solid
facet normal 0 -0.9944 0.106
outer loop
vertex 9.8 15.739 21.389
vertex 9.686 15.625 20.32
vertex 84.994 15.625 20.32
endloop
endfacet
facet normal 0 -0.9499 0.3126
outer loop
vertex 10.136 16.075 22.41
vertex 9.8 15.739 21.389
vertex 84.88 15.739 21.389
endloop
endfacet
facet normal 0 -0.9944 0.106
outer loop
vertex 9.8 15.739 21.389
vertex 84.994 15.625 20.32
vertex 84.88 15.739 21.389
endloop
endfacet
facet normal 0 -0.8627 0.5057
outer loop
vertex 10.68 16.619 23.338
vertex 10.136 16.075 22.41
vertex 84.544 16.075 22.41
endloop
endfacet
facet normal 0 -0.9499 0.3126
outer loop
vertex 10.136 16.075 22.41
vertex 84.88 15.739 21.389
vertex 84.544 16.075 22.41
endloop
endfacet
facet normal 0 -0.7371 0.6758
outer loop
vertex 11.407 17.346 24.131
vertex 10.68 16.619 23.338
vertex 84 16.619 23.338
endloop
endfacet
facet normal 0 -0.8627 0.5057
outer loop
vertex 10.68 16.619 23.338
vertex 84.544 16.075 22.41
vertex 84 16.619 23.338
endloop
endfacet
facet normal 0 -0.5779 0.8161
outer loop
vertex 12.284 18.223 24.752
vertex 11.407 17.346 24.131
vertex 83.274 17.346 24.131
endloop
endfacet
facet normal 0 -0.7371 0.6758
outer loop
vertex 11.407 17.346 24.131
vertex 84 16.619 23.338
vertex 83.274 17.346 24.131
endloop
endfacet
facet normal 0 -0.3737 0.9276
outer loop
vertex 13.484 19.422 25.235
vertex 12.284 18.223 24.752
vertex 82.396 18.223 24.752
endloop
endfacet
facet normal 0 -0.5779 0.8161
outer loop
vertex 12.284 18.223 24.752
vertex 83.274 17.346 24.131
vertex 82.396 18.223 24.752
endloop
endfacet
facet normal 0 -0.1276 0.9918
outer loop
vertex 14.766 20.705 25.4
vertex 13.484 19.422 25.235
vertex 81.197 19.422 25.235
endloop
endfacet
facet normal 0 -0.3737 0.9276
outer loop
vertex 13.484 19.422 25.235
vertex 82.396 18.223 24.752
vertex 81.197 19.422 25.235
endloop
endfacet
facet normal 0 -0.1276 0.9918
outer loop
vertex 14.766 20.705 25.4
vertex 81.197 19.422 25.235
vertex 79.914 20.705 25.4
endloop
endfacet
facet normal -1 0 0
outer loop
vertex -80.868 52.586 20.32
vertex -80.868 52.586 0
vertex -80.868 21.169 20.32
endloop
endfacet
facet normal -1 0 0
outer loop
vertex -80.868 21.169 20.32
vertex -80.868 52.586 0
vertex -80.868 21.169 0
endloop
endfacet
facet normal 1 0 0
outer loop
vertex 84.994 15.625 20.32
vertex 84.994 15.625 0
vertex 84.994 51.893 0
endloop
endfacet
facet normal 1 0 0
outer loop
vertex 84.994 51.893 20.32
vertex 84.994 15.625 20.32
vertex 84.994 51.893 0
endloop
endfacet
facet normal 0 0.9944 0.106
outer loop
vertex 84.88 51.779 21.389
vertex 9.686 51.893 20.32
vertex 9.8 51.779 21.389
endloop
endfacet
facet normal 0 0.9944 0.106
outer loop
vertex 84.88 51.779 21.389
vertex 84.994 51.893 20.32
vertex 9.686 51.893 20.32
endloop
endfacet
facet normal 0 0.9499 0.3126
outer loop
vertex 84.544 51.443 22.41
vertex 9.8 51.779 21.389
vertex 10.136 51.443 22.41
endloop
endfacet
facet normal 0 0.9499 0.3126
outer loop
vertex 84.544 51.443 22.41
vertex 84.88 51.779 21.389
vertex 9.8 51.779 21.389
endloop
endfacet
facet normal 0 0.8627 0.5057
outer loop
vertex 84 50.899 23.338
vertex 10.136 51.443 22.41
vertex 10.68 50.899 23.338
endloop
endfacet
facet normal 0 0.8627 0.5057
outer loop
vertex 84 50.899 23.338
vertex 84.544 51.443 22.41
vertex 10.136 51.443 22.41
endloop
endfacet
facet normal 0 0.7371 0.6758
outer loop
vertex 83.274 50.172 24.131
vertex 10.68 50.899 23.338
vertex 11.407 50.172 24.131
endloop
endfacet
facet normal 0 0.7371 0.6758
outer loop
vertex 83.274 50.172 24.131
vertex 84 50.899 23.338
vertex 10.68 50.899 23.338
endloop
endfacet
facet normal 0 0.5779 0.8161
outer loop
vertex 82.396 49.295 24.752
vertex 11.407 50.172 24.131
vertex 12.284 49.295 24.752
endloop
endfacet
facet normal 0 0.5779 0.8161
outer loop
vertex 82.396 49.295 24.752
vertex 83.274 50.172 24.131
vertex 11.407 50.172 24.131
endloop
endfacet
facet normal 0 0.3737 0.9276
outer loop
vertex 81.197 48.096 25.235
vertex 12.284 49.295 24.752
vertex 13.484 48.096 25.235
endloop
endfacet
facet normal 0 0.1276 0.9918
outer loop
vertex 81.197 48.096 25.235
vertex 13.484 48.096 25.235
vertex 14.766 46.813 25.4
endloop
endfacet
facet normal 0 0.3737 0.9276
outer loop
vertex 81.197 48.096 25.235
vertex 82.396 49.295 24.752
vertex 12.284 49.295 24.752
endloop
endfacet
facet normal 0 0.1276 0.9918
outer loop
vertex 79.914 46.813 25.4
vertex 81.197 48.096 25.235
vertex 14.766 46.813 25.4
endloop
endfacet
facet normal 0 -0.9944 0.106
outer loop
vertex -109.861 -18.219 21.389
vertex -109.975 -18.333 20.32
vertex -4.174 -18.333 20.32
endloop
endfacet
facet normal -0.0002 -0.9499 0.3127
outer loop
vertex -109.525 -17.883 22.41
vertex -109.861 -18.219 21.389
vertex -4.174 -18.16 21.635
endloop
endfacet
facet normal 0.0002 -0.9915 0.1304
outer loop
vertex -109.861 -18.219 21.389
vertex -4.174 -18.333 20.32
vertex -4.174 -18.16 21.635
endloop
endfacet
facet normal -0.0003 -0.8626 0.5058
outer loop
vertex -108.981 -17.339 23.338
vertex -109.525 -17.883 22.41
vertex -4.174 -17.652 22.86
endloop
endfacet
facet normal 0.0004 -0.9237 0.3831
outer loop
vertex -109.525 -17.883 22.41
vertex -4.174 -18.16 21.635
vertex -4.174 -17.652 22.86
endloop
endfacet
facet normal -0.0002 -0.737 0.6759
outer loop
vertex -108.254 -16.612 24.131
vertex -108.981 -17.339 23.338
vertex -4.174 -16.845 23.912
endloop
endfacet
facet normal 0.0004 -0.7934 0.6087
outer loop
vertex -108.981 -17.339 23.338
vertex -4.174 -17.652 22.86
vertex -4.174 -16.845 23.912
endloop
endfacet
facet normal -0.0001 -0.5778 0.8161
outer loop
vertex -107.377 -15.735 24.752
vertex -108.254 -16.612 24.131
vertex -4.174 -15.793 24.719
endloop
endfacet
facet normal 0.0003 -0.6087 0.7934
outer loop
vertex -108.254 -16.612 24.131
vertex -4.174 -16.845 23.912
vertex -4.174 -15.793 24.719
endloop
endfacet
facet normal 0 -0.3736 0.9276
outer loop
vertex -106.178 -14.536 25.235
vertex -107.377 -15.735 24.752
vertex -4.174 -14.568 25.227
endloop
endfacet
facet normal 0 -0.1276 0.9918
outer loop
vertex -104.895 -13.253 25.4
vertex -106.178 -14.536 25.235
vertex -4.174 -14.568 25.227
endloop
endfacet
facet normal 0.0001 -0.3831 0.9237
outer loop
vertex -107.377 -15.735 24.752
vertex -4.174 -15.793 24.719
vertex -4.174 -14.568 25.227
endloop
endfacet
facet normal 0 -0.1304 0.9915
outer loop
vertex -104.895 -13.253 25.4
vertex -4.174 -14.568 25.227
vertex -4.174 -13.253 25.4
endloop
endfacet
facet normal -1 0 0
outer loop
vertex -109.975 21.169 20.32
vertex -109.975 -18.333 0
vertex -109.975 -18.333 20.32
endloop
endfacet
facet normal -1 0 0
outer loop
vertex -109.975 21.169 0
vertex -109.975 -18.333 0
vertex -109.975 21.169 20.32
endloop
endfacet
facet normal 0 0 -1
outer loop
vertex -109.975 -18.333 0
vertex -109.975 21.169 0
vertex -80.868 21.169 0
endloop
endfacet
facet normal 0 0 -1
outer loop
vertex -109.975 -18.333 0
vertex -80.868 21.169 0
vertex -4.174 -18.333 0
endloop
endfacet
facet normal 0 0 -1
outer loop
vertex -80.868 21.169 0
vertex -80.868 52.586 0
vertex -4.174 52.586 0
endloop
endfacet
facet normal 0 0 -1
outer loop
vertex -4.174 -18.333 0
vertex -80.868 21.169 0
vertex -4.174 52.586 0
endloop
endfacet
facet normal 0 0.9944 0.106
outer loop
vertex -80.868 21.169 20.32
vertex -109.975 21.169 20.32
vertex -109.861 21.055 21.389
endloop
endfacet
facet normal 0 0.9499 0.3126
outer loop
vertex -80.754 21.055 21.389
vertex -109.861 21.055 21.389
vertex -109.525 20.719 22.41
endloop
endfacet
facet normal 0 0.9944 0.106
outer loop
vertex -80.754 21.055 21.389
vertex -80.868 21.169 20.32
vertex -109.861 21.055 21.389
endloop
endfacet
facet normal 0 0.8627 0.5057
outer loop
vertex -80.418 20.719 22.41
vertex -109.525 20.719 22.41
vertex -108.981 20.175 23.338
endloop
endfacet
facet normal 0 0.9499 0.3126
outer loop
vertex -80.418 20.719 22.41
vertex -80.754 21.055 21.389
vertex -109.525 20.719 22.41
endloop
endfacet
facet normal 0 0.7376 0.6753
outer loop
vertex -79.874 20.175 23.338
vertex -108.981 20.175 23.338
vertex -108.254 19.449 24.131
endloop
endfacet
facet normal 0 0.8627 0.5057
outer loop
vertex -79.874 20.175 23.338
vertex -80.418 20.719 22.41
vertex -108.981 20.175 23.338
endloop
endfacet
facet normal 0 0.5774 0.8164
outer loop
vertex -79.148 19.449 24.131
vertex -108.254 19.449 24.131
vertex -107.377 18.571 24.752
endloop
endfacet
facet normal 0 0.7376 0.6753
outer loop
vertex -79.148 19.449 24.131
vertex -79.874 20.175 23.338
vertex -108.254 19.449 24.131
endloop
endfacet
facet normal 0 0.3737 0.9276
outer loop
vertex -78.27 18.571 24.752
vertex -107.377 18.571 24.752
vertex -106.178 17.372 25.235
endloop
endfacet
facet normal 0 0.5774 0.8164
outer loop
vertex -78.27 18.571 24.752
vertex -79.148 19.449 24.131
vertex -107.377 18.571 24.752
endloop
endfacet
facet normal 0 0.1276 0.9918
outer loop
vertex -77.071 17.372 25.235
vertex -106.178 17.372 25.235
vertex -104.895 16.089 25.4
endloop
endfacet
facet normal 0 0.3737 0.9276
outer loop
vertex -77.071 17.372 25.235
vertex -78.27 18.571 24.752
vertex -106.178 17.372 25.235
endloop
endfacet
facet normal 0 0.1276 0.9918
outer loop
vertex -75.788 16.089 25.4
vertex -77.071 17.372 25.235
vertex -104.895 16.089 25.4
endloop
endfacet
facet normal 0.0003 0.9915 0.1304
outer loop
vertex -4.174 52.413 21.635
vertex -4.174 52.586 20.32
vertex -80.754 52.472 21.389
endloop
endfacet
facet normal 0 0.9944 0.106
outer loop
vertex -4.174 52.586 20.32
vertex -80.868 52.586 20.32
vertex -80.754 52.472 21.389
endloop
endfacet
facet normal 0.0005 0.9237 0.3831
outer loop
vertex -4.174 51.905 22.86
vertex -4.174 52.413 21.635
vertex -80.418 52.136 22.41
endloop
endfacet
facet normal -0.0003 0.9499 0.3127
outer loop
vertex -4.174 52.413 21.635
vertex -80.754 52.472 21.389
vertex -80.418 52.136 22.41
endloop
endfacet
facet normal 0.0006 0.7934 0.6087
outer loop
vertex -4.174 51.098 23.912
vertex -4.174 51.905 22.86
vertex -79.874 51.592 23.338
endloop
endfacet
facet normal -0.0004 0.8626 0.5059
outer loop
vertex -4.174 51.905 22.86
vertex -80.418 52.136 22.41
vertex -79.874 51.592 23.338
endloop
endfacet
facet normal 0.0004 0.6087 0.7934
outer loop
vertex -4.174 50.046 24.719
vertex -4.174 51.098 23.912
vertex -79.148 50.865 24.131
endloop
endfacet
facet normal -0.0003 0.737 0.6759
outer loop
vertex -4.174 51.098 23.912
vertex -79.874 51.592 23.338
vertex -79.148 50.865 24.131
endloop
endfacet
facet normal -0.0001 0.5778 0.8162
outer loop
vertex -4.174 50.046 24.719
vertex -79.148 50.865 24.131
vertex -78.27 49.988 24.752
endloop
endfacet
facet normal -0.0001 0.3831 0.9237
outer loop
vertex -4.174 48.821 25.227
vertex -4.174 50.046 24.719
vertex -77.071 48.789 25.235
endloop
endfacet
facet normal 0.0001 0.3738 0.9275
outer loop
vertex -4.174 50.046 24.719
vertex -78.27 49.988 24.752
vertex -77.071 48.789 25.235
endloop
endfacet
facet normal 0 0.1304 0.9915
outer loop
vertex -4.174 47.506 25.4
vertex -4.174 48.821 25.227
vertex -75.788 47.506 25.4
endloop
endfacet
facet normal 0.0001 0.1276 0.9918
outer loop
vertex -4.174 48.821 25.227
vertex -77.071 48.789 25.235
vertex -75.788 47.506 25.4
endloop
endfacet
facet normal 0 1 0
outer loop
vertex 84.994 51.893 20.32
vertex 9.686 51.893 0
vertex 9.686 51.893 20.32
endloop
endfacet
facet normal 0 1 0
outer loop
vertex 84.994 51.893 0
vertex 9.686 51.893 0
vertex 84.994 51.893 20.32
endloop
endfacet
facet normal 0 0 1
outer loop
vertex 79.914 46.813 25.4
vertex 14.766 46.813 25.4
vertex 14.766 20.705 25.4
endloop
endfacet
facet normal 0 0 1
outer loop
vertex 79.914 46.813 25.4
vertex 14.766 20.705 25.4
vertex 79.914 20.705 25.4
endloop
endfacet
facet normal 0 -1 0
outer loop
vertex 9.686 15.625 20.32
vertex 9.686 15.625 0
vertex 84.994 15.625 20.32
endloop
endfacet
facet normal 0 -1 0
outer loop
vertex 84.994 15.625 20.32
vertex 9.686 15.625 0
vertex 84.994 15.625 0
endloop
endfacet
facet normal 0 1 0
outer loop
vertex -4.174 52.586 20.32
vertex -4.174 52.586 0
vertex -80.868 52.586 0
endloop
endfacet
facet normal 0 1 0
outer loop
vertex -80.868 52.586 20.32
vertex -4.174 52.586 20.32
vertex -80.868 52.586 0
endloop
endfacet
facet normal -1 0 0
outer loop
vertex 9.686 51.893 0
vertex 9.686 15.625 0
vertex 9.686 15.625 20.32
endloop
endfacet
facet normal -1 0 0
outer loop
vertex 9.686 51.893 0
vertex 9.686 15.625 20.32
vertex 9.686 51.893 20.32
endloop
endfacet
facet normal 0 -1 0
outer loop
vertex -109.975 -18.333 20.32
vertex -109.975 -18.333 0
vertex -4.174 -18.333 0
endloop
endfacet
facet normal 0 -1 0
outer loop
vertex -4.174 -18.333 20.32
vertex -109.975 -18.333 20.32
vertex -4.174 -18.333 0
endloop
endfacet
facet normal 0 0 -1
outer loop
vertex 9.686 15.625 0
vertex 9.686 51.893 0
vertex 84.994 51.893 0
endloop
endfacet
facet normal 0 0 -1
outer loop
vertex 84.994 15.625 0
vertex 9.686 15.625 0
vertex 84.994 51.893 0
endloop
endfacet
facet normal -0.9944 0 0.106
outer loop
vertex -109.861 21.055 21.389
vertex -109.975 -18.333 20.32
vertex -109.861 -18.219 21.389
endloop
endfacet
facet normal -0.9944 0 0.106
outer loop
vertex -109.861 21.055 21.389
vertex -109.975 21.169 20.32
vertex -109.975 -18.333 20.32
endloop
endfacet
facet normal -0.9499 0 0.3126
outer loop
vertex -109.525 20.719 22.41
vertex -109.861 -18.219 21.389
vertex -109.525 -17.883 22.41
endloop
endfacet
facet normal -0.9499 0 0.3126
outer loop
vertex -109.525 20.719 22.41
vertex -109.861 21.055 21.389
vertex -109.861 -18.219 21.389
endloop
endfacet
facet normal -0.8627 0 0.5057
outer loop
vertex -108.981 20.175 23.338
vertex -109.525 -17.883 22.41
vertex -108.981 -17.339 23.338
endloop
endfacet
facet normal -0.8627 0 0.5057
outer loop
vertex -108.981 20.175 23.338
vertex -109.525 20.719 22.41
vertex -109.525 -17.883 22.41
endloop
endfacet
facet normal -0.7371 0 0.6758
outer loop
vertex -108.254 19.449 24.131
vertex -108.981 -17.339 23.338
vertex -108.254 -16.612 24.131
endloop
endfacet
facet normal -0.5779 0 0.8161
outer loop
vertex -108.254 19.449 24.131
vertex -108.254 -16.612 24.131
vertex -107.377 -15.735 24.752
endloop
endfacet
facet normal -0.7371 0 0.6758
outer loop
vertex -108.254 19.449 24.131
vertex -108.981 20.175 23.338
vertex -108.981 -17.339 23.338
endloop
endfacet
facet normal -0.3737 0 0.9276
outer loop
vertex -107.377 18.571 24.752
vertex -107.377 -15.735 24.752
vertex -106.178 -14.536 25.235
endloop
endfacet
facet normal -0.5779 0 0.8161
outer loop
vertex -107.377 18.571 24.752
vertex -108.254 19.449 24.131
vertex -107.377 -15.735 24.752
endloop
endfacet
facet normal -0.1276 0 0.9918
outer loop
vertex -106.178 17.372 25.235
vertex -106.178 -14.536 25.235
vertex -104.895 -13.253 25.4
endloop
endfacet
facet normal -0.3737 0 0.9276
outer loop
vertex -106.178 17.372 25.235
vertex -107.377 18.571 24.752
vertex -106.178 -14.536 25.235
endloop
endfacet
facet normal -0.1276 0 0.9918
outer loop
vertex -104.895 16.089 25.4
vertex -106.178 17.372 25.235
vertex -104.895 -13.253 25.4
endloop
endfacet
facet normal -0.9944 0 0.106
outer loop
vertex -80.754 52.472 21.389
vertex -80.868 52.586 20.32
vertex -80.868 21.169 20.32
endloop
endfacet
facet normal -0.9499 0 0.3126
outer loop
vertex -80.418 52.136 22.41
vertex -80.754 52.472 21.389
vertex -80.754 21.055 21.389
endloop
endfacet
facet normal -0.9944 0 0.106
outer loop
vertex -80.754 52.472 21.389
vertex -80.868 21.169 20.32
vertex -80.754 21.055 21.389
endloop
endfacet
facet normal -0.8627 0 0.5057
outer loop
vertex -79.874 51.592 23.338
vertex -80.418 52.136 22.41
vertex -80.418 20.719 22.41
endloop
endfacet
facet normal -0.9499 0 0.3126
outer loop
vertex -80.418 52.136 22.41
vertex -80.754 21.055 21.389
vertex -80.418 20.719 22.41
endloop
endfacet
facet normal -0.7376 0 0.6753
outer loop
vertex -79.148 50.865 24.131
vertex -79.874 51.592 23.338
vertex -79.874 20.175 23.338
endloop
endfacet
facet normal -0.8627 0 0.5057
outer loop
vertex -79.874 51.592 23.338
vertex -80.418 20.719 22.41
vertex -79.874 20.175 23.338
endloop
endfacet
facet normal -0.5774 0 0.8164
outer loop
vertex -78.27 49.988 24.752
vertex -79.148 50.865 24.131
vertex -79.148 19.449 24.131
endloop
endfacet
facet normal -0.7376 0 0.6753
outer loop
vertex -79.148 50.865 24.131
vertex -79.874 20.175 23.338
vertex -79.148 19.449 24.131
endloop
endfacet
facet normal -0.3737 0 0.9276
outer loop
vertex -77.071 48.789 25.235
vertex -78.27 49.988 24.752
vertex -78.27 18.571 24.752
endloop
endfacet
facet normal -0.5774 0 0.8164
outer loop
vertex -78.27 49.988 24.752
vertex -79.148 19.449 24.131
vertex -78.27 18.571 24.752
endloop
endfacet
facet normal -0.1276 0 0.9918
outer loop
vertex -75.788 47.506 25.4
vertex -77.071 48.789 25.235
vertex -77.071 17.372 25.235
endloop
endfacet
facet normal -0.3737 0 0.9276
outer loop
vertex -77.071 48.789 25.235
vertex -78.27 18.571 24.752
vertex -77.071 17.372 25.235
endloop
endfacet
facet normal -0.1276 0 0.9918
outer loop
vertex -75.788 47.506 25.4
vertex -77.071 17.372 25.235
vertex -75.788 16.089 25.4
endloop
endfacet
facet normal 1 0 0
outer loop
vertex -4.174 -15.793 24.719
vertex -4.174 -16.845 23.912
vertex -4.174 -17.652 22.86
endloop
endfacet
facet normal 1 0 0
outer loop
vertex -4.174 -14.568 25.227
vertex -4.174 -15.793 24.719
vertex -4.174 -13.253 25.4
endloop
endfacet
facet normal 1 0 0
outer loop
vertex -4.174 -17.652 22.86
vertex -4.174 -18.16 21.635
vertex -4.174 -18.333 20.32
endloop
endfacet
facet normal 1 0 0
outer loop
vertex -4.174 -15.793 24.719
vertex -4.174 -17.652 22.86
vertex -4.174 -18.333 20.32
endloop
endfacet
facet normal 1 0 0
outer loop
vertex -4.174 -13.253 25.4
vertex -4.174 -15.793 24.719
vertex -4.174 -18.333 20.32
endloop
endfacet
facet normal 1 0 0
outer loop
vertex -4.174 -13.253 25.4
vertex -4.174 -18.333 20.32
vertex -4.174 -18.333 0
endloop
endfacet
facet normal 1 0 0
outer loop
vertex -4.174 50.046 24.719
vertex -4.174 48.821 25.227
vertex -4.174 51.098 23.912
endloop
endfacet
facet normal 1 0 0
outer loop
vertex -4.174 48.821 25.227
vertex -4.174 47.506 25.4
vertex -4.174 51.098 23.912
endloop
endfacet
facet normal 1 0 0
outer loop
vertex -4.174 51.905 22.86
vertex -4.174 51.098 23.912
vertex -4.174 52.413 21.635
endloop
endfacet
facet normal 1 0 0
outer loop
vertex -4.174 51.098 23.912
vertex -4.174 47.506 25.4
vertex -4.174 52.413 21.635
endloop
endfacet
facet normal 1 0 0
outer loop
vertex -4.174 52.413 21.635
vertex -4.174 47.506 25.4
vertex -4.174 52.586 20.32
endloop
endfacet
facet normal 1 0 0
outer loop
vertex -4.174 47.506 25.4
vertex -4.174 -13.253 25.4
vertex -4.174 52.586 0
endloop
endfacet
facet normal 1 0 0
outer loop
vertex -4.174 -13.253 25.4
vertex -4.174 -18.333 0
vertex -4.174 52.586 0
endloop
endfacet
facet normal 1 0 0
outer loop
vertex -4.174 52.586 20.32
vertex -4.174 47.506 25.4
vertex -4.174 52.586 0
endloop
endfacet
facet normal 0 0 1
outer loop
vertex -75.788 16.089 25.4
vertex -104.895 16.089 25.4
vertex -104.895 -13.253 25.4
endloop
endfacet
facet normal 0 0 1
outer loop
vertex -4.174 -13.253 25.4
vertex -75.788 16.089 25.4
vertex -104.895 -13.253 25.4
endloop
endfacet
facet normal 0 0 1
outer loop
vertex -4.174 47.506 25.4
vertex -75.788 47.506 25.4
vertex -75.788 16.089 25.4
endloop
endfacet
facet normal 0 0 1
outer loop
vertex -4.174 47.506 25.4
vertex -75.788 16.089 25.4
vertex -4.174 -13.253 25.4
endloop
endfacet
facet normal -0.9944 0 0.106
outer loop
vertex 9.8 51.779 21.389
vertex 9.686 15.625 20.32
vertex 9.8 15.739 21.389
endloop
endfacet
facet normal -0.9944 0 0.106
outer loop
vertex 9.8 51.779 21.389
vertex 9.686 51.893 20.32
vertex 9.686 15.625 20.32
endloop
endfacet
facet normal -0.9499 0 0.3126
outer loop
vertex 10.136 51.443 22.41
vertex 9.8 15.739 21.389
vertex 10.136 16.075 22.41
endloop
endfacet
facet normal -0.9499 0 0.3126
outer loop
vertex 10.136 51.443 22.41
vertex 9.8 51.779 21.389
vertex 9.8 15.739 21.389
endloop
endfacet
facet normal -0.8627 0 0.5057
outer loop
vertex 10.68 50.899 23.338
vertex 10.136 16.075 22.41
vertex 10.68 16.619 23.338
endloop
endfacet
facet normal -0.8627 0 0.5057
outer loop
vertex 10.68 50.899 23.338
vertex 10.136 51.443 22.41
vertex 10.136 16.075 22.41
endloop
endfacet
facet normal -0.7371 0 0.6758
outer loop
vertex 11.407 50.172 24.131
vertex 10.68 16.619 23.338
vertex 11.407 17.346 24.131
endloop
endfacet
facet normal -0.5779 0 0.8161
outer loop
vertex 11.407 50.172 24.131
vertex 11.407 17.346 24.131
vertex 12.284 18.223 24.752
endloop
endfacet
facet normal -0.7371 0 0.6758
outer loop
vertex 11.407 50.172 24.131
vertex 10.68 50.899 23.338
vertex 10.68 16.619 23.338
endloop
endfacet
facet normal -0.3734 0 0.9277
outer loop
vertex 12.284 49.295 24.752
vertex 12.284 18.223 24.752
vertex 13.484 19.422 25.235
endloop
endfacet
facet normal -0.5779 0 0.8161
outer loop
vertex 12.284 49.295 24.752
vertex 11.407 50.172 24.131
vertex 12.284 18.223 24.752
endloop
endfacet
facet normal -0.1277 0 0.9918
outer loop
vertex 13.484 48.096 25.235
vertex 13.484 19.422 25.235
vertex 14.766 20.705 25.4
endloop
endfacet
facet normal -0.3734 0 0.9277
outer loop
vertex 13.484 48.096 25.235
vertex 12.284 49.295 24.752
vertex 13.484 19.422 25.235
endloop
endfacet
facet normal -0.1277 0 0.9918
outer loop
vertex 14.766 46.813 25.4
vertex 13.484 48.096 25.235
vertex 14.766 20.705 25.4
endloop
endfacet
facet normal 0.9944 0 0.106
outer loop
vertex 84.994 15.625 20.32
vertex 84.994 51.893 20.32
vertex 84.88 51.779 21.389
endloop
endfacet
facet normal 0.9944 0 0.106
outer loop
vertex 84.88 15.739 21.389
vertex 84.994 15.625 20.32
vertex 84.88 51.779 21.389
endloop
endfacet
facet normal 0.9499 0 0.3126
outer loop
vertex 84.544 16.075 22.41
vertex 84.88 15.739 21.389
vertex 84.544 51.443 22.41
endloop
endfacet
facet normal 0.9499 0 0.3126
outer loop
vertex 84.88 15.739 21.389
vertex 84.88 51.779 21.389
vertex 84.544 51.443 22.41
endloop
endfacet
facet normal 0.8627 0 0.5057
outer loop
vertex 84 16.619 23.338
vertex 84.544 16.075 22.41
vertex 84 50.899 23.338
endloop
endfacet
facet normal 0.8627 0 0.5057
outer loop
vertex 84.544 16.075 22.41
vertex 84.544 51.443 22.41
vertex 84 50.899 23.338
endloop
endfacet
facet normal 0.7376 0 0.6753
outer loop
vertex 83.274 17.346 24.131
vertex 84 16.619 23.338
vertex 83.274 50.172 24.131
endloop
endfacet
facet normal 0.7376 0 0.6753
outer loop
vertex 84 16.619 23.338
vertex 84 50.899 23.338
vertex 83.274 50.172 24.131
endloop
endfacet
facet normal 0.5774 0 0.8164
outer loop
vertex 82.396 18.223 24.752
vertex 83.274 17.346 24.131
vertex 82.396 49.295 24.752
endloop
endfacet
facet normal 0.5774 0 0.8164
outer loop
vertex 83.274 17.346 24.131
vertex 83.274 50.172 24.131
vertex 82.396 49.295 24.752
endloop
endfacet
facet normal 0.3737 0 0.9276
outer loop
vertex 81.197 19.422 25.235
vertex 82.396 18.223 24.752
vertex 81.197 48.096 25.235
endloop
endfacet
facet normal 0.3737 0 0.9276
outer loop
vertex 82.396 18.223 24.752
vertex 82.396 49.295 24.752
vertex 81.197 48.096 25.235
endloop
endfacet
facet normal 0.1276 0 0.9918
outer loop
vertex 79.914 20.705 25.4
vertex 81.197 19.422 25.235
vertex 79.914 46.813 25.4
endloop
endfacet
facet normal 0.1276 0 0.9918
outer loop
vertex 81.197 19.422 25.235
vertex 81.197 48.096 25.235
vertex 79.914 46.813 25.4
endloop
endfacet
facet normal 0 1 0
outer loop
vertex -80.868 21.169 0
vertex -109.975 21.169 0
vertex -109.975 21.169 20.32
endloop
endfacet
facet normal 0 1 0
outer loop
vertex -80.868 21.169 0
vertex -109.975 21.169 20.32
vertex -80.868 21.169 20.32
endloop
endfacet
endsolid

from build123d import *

# Parameters (mm, degrees)
F0_W     = 35.5749689043
F0_H     = 39.502074942
F0_W_2   = 29.1067957878
F1_DEPTH = 25.4
F0_W_3   = 75.3080425784
F0_H_2   = 36.2679893151
F2_R     = 5.08
F2_2_R   = 5.08


with BuildPart() as f1:
    # F0 (on Top) → F1 (new body)
    with BuildSketch(Plane.XY):
        Polygon((-4.1741500609, 52.5860078633), (-80.8682367206, 52.5860078633), (-80.8682367206, 21.1691502482), (-45.2932678163, 21.1691502482), (-45.2932678163, -18.3329246938), (-4.1741500609, -18.3329246938), align=None)
        with Locations((-63.0807522684, 1.4181127772)):
            Rectangle(F0_W, F0_H)
        with Locations((-95.4216346145, 1.4181127772)):
            Rectangle(F0_W_2, F0_H)
    extrude(amount=F1_DEPTH)

    # F2
    f2_edges = [f1.edges().sort_by_distance(p)[0] for p in [
        (-80.868237, 36.877579, 25.4),
        (-42.521193, 52.586008, 25.4),
        (-95.421635, 21.16915, 25.4),
        (-109.975033, 1.418113, 25.4),
        (-57.074591, -18.332925, 25.4),
    ]]
    fillet(f2_edges, radius=F2_R)


with BuildPart() as f1b:
    # F0 (on Top) → F1, piece 2 (new body)
    with BuildSketch(Plane.XY):
        with Locations((47.3402501084, 33.7589937262)):
            Rectangle(F0_W_3, F0_H_2)
    extrude(amount=F1_DEPTH)

    # F2#2
    f2_2_edges = [f1b.edges().sort_by_distance(p)[0] for p in [
        (47.34025, 51.892988, 25.4),
        (9.686229, 33.758994, 25.4),
        (47.34025, 15.624999, 25.4),
        (84.994271, 33.758994, 25.4),
    ]]
    fillet(f2_2_edges, radius=F2_2_R)


solid = Compound([f1.part, f1b.part])
